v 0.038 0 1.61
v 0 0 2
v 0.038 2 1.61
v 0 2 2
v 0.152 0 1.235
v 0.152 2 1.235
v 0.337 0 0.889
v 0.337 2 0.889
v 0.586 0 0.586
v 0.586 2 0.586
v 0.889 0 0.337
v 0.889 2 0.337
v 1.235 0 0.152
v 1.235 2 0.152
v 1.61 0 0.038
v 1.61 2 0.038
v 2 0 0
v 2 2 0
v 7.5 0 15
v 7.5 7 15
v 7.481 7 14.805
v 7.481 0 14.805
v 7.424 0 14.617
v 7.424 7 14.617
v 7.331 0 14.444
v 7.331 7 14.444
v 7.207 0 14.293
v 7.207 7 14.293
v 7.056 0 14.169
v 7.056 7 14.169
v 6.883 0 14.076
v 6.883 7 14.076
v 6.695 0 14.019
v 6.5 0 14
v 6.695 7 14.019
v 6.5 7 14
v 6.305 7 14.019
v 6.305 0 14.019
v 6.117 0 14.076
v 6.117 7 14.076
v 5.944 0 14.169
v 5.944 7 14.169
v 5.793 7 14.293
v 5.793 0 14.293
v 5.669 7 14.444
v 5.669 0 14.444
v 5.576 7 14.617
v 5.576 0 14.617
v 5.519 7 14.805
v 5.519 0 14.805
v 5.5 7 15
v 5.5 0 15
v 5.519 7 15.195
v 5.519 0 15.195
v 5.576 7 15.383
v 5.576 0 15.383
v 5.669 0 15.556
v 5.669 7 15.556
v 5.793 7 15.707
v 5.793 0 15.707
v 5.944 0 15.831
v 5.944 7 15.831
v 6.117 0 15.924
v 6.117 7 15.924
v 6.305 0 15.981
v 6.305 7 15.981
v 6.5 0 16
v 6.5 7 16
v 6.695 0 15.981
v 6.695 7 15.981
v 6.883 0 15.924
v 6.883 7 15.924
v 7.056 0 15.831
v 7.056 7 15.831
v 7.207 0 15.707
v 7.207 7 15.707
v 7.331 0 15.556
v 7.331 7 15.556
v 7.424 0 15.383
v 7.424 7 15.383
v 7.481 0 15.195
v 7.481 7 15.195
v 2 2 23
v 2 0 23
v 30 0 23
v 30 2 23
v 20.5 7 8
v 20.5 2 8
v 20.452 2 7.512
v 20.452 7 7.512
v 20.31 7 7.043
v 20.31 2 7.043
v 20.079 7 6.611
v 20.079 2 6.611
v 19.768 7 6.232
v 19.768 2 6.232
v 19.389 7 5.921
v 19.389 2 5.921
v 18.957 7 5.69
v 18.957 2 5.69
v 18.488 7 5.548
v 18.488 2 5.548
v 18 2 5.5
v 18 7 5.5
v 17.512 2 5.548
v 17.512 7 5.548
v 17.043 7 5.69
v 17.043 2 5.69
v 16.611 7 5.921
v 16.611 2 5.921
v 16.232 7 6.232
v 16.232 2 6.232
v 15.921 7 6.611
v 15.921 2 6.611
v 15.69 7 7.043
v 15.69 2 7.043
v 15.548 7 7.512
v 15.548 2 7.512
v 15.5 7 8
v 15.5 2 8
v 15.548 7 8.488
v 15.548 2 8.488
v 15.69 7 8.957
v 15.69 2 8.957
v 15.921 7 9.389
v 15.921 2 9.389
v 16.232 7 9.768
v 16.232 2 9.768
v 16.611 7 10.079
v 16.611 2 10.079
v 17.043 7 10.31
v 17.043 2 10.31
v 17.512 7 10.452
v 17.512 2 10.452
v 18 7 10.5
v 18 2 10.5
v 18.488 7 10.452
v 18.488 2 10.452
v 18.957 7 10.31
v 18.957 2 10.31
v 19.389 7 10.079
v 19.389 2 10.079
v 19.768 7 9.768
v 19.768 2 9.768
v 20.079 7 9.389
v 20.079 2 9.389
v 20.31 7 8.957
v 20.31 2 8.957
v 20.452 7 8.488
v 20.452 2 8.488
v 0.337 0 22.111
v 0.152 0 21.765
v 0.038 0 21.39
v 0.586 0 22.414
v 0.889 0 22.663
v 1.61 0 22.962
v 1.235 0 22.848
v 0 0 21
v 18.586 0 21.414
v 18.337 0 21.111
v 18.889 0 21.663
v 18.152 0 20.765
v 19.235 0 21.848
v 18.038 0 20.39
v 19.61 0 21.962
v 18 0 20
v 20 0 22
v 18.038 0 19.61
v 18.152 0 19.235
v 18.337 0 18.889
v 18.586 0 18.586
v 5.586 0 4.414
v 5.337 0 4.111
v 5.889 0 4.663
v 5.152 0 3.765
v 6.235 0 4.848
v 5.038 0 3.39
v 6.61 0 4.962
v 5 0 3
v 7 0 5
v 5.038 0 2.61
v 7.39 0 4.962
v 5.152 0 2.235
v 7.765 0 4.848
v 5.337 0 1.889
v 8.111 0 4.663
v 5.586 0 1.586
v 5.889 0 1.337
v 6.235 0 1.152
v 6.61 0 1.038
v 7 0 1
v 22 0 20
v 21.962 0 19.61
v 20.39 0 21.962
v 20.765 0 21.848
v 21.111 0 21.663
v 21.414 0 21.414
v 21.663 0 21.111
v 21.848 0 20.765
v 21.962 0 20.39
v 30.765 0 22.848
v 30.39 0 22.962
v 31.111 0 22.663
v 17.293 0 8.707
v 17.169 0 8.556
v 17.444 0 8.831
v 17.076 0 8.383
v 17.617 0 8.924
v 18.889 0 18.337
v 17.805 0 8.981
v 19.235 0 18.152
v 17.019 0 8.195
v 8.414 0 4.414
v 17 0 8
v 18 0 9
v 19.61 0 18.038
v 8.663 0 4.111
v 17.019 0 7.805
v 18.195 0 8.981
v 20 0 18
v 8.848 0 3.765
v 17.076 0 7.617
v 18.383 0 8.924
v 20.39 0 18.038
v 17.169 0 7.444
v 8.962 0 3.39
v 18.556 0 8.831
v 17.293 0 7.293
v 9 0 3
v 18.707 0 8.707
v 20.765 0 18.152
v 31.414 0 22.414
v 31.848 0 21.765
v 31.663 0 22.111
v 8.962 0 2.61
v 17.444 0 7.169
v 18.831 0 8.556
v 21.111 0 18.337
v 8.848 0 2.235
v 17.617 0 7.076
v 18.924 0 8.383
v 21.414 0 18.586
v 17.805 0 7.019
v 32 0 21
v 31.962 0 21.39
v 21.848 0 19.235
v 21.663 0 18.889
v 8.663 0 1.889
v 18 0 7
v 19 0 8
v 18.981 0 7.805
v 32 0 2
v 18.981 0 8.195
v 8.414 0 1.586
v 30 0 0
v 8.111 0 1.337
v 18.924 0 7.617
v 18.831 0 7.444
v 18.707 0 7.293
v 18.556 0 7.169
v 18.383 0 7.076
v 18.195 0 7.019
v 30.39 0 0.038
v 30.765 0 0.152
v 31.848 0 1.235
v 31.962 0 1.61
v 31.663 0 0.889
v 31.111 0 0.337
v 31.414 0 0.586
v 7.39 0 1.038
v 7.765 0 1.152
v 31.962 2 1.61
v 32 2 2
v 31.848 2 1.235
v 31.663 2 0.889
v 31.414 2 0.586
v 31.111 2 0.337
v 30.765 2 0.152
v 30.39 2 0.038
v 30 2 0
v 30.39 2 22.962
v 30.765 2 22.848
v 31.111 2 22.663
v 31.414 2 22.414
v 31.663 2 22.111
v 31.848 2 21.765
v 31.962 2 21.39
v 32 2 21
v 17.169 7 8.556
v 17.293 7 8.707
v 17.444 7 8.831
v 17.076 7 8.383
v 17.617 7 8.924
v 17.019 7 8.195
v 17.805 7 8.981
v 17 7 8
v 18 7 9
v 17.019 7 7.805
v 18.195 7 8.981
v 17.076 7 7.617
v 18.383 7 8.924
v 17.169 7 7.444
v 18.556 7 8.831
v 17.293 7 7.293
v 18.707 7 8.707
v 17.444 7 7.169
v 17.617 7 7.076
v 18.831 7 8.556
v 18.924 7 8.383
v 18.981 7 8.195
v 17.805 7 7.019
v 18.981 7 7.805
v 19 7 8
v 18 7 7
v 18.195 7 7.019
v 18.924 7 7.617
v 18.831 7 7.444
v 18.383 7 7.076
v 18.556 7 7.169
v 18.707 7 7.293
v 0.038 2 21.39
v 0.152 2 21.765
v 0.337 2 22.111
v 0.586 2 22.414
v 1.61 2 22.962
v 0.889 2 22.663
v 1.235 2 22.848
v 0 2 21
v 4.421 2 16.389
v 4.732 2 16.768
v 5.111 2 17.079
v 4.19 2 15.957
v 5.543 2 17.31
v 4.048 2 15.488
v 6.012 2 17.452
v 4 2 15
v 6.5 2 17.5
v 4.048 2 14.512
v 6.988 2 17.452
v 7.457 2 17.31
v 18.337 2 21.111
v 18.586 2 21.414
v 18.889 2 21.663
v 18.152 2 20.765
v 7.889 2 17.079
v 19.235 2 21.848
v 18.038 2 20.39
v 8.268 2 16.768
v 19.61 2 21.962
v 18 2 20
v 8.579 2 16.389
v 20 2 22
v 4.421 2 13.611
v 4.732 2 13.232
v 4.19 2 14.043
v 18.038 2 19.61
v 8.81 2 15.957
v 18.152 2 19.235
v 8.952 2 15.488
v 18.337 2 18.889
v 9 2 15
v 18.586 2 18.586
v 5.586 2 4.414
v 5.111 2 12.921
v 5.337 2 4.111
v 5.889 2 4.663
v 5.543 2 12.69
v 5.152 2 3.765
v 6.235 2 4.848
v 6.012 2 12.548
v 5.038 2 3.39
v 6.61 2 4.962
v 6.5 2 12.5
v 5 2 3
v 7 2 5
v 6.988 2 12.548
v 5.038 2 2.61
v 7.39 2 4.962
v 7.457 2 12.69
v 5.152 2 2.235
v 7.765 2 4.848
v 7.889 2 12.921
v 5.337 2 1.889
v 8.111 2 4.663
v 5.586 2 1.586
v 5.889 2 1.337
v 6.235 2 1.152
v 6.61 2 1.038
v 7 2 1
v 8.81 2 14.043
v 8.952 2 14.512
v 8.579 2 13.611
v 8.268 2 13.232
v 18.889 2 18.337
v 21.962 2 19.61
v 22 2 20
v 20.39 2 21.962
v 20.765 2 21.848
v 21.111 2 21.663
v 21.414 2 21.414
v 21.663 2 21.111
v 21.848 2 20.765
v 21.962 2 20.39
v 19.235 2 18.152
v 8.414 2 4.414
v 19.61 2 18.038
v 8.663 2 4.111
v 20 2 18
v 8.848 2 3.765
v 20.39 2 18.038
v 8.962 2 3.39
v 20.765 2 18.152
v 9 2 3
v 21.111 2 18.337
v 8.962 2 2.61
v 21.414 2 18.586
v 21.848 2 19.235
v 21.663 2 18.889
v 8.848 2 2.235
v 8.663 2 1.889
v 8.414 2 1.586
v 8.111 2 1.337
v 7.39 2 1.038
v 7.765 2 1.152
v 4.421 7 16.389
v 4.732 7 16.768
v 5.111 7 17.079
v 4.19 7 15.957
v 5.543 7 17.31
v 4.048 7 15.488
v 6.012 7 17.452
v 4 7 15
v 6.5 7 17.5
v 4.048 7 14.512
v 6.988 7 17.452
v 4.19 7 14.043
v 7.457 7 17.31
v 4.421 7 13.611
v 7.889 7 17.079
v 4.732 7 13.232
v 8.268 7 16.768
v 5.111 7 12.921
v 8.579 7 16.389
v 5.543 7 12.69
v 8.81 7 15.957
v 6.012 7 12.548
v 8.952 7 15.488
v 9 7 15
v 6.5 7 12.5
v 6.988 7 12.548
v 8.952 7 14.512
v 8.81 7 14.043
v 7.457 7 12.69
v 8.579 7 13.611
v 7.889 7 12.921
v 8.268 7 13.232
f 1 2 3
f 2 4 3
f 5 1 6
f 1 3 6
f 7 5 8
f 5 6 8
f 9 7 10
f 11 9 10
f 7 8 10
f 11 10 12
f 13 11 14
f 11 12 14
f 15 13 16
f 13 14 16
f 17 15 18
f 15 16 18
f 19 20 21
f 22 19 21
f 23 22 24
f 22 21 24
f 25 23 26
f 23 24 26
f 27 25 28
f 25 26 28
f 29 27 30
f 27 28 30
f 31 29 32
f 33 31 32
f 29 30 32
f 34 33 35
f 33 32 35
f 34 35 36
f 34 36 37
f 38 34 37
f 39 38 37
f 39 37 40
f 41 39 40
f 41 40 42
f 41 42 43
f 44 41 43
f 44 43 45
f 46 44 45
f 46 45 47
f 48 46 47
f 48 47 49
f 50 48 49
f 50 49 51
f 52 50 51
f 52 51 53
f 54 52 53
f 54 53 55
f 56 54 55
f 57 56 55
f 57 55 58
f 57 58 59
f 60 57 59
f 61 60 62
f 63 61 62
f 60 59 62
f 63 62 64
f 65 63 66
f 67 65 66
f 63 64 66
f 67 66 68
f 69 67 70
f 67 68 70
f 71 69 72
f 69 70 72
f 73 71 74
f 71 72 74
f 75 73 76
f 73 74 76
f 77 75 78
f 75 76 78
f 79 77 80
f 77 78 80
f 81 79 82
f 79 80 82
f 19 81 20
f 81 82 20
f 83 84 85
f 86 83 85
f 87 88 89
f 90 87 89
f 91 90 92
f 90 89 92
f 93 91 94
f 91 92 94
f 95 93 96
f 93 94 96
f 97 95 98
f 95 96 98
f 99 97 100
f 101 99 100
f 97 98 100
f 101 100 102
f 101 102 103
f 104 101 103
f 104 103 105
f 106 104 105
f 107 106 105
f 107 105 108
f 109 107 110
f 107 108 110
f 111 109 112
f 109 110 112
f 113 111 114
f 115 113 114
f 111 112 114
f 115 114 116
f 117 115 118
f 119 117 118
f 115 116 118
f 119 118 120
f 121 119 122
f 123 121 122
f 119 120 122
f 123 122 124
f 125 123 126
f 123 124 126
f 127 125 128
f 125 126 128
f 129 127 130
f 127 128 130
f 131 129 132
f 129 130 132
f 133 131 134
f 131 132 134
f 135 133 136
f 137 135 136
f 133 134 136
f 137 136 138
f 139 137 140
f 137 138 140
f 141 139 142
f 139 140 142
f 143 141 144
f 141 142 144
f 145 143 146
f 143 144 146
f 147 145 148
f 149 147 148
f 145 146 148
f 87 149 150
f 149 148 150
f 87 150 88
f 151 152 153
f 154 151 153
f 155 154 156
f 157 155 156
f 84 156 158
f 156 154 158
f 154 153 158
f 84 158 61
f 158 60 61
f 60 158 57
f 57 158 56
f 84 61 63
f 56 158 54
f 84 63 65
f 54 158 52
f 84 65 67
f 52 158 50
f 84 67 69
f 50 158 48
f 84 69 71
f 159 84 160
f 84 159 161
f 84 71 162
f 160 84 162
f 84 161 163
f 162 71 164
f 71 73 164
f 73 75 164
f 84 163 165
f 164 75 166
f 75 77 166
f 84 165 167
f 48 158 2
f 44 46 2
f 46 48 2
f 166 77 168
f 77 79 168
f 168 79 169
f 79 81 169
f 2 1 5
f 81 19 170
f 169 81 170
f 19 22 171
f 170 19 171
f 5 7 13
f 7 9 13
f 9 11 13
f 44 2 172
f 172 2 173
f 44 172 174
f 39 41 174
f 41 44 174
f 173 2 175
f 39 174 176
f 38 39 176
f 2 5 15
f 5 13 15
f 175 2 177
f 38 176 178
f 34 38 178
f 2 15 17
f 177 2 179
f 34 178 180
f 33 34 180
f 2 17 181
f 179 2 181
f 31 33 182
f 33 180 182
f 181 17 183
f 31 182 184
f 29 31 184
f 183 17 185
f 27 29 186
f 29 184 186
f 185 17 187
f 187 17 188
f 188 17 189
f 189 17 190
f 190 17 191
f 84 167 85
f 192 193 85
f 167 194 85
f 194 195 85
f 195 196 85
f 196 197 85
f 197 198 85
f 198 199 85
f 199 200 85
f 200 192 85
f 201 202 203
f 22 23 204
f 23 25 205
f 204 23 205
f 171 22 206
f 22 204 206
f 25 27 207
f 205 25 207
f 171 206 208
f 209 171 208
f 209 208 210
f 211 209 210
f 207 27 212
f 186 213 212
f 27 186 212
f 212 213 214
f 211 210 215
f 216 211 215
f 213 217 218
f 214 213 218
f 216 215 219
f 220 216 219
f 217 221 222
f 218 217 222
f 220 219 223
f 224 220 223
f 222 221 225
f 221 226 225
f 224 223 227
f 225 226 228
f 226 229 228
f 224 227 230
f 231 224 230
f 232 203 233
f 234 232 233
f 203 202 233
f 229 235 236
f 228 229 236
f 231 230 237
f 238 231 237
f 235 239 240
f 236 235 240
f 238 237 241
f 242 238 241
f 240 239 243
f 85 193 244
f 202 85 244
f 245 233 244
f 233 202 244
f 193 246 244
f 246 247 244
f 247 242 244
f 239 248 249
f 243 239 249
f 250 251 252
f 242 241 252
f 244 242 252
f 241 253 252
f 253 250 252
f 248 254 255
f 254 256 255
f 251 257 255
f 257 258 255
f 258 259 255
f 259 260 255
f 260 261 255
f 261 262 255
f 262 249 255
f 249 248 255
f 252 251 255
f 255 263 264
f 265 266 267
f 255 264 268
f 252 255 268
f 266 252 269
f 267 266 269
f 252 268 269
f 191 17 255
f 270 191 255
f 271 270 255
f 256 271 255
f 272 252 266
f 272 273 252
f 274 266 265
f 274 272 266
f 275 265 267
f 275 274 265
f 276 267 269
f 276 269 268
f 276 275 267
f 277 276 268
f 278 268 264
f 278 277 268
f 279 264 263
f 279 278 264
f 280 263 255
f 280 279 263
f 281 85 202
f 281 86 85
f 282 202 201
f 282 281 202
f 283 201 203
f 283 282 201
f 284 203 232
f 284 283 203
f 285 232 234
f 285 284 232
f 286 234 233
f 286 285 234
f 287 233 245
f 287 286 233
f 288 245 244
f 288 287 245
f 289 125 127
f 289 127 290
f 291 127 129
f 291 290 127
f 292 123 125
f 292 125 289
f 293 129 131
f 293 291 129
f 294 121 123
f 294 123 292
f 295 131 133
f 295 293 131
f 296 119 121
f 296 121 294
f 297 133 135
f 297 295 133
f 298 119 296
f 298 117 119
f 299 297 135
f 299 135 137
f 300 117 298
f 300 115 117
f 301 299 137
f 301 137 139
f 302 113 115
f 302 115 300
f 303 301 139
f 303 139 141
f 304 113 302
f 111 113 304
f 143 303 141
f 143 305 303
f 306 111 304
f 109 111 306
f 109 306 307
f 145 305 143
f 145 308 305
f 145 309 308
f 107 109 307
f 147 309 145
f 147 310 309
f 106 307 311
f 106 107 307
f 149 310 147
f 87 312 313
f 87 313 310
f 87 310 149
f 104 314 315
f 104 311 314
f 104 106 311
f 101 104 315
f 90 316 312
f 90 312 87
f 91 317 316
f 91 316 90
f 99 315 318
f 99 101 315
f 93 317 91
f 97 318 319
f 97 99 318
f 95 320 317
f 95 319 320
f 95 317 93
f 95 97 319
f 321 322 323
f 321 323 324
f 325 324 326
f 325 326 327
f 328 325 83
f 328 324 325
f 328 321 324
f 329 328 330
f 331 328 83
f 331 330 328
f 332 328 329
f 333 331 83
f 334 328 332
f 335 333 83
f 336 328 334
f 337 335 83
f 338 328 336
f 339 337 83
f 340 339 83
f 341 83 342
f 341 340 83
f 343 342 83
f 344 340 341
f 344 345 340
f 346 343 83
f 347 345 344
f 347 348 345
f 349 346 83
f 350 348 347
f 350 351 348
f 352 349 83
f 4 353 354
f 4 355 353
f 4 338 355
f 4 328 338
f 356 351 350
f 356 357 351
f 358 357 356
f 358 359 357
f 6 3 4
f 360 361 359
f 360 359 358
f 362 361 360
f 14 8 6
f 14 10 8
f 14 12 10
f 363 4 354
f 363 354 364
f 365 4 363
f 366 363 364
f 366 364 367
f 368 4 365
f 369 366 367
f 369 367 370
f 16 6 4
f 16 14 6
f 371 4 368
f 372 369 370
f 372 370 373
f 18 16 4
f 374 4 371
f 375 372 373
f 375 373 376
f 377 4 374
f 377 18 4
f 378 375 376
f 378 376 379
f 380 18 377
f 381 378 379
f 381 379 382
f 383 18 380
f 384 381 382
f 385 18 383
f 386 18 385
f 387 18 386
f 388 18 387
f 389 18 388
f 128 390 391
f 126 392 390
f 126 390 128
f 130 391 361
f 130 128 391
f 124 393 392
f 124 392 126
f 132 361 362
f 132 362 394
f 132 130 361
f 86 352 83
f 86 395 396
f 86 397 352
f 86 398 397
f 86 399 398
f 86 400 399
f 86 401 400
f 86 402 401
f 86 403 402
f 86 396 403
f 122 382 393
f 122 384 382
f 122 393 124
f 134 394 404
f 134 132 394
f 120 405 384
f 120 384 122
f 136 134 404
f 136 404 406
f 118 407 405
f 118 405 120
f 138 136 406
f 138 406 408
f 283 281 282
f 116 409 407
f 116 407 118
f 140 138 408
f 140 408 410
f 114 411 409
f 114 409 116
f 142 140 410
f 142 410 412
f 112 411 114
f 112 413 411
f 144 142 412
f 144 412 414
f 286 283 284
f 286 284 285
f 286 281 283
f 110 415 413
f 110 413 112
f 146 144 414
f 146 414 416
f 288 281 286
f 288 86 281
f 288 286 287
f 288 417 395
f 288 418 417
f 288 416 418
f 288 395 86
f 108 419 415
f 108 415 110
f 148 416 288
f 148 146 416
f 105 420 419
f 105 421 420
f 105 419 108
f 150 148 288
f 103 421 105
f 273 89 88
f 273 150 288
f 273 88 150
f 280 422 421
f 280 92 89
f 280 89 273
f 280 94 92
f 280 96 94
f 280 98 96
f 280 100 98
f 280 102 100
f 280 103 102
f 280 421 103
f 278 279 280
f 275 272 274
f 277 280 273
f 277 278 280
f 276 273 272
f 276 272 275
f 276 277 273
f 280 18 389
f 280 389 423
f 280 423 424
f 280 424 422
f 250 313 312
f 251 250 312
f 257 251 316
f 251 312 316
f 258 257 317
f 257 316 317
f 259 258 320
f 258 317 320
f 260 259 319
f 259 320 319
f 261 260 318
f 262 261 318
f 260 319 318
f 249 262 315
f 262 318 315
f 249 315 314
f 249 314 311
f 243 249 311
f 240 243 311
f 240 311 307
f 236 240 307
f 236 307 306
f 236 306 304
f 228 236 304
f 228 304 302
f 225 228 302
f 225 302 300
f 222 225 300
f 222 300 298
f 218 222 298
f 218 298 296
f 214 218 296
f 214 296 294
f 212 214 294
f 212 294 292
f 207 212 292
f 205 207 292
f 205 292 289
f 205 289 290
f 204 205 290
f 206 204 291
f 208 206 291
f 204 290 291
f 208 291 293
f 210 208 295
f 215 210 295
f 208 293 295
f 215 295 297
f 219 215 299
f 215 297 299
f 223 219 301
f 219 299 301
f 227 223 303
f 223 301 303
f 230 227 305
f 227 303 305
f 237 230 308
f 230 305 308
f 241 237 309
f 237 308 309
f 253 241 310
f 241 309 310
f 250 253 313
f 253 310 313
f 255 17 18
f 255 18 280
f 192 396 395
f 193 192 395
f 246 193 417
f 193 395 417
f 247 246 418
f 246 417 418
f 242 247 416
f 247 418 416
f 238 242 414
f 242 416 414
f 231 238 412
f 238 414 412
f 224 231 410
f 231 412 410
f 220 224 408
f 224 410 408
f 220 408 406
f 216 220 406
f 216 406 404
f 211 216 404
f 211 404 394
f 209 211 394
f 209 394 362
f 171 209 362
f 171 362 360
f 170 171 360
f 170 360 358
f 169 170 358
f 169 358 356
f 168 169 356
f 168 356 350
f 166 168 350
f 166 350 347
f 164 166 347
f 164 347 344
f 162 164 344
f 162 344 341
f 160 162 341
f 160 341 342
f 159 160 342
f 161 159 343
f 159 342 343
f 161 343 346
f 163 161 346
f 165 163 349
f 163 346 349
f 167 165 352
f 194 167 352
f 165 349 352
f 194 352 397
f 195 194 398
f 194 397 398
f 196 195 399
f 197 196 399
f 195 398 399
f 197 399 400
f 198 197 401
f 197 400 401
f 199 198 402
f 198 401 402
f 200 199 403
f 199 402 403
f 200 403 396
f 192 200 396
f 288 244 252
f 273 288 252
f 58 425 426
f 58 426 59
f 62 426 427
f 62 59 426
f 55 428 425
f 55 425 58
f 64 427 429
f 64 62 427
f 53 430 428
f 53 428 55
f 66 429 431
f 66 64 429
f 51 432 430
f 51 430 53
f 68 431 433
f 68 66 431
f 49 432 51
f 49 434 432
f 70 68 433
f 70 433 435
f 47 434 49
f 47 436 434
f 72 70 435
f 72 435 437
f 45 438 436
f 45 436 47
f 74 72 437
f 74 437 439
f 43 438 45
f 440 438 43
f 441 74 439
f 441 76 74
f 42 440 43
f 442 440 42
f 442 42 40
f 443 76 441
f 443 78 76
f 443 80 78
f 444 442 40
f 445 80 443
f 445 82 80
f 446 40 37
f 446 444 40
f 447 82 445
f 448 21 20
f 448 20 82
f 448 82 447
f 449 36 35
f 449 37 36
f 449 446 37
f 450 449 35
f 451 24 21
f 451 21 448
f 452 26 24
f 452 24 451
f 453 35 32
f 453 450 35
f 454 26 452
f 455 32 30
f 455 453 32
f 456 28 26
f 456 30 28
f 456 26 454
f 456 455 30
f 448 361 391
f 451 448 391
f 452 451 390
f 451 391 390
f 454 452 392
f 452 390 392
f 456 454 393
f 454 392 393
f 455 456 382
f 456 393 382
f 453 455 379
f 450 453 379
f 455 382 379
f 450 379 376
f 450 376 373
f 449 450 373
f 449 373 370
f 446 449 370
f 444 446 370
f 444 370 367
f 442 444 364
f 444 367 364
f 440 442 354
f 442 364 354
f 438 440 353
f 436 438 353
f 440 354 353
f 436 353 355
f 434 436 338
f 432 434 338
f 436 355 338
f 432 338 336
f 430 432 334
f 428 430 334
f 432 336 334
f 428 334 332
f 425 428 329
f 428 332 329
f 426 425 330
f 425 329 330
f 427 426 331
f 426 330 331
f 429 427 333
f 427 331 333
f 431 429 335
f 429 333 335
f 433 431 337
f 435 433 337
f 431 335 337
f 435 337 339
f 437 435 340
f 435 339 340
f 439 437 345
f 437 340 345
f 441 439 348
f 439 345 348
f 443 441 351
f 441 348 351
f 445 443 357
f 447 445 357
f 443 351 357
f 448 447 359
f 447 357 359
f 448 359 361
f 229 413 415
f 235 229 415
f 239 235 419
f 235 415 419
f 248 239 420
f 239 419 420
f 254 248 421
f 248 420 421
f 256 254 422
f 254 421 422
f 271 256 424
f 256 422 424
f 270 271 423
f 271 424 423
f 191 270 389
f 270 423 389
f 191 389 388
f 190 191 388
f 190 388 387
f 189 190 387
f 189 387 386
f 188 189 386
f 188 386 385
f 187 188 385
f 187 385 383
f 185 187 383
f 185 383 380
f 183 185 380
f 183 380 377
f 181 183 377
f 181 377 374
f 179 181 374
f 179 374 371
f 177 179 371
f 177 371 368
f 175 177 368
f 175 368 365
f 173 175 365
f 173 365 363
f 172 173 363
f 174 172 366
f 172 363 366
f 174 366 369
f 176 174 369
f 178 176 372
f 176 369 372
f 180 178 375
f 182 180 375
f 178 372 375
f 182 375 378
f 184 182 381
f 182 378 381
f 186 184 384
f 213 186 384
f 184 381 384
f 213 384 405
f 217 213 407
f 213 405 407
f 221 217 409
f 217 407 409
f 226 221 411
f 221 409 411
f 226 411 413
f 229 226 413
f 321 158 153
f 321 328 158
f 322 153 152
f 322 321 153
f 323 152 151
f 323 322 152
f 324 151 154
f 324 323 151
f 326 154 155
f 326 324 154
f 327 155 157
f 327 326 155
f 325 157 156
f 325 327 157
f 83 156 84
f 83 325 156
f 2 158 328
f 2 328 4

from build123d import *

# Parameters (mm, degrees)
SKETCH_1_W          = 32
SKETCH_1_H          = 23
EXTRUDE_1_DEPTH     = 2
SKETCH_4_R          = 2.5
EXTRUDE_2_DEPTH     = 5
SKETCH_5_R          = 1
CUT_EXTRUDE_1_DEPTH = 8
SKETCH_7_R          = 2
CUT_EXTRUDE_2_DEPTH = 3
FILLET_1_R          = 2
FILLET_2_R          = 2
FILLET_3_R          = 2
FILLET_4_R          = 2


with BuildPart() as part:
    # Эскиз1 → Бобышка-Вытянуть1 (new body)
    with BuildSketch(Plane(origin=(0, 0, 0), x_dir=(1, 0, 0), z_dir=(0, 1, 0))):
        with Locations((16, -11.5)):
            Rectangle(SKETCH_1_W, SKETCH_1_H)
    extrude(amount=EXTRUDE_1_DEPTH)

    # Эскиз4 → Бобышка-Вытянуть2 (add)
    with BuildSketch(Plane(origin=(0, 2, 0), x_dir=(1, 0, 0), z_dir=(0, 1, 0))):
        with Locations((18, -8)):
            Circle(SKETCH_4_R)
        with Locations((6.5, -15)):
            Circle(SKETCH_4_R)
    extrude(amount=EXTRUDE_2_DEPTH)

    # Эскиз5 → Вырез-Вытянуть1 (cut, through all)
    with BuildSketch(Plane(origin=(0, 7, 0), x_dir=(1, 0, 0), z_dir=(0, 1, 0))):
        with Locations((6.5, -15)):
            Circle(SKETCH_5_R)
        with Locations((18, -8)):
            Circle(SKETCH_5_R)
    extrude(amount=-CUT_EXTRUDE_1_DEPTH, mode=Mode.SUBTRACT)

    # Эскиз7 → Вырез-Вытянуть2 (cut, through all)
    with BuildSketch(Plane(origin=(0, 2, 0), x_dir=(1, 0, 0), z_dir=(0, 1, 0))):
        with Locations((7, -3)):
            Circle(SKETCH_7_R)
        with Locations((20, -20)):
            Circle(SKETCH_7_R)
    extrude(amount=-CUT_EXTRUDE_2_DEPTH, mode=Mode.SUBTRACT)

    # Скругление1
    fillet_1_edges = [part.edges().sort_by_distance(p)[0] for p in [
        (0, 1, 0),
    ]]
    fillet(fillet_1_edges, radius=FILLET_1_R)

    # Скругление2
    fillet_2_edges = [part.edges().sort_by_distance(p)[0] for p in [
        (0, 1, 23),
    ]]
    fillet(fillet_2_edges, radius=FILLET_2_R)

    # Скругление3
    fillet_3_edges = [part.edges().sort_by_distance(p)[0] for p in [
        (32, 1, 23),
    ]]
    fillet(fillet_3_edges, radius=FILLET_3_R)

    # Скругление4
    fillet_4_edges = [part.edges().sort_by_distance(p)[0] for p in [
        (32, 1, 0),
    ]]
    fillet(fillet_4_edges, radius=FILLET_4_R)


solid = part.part
